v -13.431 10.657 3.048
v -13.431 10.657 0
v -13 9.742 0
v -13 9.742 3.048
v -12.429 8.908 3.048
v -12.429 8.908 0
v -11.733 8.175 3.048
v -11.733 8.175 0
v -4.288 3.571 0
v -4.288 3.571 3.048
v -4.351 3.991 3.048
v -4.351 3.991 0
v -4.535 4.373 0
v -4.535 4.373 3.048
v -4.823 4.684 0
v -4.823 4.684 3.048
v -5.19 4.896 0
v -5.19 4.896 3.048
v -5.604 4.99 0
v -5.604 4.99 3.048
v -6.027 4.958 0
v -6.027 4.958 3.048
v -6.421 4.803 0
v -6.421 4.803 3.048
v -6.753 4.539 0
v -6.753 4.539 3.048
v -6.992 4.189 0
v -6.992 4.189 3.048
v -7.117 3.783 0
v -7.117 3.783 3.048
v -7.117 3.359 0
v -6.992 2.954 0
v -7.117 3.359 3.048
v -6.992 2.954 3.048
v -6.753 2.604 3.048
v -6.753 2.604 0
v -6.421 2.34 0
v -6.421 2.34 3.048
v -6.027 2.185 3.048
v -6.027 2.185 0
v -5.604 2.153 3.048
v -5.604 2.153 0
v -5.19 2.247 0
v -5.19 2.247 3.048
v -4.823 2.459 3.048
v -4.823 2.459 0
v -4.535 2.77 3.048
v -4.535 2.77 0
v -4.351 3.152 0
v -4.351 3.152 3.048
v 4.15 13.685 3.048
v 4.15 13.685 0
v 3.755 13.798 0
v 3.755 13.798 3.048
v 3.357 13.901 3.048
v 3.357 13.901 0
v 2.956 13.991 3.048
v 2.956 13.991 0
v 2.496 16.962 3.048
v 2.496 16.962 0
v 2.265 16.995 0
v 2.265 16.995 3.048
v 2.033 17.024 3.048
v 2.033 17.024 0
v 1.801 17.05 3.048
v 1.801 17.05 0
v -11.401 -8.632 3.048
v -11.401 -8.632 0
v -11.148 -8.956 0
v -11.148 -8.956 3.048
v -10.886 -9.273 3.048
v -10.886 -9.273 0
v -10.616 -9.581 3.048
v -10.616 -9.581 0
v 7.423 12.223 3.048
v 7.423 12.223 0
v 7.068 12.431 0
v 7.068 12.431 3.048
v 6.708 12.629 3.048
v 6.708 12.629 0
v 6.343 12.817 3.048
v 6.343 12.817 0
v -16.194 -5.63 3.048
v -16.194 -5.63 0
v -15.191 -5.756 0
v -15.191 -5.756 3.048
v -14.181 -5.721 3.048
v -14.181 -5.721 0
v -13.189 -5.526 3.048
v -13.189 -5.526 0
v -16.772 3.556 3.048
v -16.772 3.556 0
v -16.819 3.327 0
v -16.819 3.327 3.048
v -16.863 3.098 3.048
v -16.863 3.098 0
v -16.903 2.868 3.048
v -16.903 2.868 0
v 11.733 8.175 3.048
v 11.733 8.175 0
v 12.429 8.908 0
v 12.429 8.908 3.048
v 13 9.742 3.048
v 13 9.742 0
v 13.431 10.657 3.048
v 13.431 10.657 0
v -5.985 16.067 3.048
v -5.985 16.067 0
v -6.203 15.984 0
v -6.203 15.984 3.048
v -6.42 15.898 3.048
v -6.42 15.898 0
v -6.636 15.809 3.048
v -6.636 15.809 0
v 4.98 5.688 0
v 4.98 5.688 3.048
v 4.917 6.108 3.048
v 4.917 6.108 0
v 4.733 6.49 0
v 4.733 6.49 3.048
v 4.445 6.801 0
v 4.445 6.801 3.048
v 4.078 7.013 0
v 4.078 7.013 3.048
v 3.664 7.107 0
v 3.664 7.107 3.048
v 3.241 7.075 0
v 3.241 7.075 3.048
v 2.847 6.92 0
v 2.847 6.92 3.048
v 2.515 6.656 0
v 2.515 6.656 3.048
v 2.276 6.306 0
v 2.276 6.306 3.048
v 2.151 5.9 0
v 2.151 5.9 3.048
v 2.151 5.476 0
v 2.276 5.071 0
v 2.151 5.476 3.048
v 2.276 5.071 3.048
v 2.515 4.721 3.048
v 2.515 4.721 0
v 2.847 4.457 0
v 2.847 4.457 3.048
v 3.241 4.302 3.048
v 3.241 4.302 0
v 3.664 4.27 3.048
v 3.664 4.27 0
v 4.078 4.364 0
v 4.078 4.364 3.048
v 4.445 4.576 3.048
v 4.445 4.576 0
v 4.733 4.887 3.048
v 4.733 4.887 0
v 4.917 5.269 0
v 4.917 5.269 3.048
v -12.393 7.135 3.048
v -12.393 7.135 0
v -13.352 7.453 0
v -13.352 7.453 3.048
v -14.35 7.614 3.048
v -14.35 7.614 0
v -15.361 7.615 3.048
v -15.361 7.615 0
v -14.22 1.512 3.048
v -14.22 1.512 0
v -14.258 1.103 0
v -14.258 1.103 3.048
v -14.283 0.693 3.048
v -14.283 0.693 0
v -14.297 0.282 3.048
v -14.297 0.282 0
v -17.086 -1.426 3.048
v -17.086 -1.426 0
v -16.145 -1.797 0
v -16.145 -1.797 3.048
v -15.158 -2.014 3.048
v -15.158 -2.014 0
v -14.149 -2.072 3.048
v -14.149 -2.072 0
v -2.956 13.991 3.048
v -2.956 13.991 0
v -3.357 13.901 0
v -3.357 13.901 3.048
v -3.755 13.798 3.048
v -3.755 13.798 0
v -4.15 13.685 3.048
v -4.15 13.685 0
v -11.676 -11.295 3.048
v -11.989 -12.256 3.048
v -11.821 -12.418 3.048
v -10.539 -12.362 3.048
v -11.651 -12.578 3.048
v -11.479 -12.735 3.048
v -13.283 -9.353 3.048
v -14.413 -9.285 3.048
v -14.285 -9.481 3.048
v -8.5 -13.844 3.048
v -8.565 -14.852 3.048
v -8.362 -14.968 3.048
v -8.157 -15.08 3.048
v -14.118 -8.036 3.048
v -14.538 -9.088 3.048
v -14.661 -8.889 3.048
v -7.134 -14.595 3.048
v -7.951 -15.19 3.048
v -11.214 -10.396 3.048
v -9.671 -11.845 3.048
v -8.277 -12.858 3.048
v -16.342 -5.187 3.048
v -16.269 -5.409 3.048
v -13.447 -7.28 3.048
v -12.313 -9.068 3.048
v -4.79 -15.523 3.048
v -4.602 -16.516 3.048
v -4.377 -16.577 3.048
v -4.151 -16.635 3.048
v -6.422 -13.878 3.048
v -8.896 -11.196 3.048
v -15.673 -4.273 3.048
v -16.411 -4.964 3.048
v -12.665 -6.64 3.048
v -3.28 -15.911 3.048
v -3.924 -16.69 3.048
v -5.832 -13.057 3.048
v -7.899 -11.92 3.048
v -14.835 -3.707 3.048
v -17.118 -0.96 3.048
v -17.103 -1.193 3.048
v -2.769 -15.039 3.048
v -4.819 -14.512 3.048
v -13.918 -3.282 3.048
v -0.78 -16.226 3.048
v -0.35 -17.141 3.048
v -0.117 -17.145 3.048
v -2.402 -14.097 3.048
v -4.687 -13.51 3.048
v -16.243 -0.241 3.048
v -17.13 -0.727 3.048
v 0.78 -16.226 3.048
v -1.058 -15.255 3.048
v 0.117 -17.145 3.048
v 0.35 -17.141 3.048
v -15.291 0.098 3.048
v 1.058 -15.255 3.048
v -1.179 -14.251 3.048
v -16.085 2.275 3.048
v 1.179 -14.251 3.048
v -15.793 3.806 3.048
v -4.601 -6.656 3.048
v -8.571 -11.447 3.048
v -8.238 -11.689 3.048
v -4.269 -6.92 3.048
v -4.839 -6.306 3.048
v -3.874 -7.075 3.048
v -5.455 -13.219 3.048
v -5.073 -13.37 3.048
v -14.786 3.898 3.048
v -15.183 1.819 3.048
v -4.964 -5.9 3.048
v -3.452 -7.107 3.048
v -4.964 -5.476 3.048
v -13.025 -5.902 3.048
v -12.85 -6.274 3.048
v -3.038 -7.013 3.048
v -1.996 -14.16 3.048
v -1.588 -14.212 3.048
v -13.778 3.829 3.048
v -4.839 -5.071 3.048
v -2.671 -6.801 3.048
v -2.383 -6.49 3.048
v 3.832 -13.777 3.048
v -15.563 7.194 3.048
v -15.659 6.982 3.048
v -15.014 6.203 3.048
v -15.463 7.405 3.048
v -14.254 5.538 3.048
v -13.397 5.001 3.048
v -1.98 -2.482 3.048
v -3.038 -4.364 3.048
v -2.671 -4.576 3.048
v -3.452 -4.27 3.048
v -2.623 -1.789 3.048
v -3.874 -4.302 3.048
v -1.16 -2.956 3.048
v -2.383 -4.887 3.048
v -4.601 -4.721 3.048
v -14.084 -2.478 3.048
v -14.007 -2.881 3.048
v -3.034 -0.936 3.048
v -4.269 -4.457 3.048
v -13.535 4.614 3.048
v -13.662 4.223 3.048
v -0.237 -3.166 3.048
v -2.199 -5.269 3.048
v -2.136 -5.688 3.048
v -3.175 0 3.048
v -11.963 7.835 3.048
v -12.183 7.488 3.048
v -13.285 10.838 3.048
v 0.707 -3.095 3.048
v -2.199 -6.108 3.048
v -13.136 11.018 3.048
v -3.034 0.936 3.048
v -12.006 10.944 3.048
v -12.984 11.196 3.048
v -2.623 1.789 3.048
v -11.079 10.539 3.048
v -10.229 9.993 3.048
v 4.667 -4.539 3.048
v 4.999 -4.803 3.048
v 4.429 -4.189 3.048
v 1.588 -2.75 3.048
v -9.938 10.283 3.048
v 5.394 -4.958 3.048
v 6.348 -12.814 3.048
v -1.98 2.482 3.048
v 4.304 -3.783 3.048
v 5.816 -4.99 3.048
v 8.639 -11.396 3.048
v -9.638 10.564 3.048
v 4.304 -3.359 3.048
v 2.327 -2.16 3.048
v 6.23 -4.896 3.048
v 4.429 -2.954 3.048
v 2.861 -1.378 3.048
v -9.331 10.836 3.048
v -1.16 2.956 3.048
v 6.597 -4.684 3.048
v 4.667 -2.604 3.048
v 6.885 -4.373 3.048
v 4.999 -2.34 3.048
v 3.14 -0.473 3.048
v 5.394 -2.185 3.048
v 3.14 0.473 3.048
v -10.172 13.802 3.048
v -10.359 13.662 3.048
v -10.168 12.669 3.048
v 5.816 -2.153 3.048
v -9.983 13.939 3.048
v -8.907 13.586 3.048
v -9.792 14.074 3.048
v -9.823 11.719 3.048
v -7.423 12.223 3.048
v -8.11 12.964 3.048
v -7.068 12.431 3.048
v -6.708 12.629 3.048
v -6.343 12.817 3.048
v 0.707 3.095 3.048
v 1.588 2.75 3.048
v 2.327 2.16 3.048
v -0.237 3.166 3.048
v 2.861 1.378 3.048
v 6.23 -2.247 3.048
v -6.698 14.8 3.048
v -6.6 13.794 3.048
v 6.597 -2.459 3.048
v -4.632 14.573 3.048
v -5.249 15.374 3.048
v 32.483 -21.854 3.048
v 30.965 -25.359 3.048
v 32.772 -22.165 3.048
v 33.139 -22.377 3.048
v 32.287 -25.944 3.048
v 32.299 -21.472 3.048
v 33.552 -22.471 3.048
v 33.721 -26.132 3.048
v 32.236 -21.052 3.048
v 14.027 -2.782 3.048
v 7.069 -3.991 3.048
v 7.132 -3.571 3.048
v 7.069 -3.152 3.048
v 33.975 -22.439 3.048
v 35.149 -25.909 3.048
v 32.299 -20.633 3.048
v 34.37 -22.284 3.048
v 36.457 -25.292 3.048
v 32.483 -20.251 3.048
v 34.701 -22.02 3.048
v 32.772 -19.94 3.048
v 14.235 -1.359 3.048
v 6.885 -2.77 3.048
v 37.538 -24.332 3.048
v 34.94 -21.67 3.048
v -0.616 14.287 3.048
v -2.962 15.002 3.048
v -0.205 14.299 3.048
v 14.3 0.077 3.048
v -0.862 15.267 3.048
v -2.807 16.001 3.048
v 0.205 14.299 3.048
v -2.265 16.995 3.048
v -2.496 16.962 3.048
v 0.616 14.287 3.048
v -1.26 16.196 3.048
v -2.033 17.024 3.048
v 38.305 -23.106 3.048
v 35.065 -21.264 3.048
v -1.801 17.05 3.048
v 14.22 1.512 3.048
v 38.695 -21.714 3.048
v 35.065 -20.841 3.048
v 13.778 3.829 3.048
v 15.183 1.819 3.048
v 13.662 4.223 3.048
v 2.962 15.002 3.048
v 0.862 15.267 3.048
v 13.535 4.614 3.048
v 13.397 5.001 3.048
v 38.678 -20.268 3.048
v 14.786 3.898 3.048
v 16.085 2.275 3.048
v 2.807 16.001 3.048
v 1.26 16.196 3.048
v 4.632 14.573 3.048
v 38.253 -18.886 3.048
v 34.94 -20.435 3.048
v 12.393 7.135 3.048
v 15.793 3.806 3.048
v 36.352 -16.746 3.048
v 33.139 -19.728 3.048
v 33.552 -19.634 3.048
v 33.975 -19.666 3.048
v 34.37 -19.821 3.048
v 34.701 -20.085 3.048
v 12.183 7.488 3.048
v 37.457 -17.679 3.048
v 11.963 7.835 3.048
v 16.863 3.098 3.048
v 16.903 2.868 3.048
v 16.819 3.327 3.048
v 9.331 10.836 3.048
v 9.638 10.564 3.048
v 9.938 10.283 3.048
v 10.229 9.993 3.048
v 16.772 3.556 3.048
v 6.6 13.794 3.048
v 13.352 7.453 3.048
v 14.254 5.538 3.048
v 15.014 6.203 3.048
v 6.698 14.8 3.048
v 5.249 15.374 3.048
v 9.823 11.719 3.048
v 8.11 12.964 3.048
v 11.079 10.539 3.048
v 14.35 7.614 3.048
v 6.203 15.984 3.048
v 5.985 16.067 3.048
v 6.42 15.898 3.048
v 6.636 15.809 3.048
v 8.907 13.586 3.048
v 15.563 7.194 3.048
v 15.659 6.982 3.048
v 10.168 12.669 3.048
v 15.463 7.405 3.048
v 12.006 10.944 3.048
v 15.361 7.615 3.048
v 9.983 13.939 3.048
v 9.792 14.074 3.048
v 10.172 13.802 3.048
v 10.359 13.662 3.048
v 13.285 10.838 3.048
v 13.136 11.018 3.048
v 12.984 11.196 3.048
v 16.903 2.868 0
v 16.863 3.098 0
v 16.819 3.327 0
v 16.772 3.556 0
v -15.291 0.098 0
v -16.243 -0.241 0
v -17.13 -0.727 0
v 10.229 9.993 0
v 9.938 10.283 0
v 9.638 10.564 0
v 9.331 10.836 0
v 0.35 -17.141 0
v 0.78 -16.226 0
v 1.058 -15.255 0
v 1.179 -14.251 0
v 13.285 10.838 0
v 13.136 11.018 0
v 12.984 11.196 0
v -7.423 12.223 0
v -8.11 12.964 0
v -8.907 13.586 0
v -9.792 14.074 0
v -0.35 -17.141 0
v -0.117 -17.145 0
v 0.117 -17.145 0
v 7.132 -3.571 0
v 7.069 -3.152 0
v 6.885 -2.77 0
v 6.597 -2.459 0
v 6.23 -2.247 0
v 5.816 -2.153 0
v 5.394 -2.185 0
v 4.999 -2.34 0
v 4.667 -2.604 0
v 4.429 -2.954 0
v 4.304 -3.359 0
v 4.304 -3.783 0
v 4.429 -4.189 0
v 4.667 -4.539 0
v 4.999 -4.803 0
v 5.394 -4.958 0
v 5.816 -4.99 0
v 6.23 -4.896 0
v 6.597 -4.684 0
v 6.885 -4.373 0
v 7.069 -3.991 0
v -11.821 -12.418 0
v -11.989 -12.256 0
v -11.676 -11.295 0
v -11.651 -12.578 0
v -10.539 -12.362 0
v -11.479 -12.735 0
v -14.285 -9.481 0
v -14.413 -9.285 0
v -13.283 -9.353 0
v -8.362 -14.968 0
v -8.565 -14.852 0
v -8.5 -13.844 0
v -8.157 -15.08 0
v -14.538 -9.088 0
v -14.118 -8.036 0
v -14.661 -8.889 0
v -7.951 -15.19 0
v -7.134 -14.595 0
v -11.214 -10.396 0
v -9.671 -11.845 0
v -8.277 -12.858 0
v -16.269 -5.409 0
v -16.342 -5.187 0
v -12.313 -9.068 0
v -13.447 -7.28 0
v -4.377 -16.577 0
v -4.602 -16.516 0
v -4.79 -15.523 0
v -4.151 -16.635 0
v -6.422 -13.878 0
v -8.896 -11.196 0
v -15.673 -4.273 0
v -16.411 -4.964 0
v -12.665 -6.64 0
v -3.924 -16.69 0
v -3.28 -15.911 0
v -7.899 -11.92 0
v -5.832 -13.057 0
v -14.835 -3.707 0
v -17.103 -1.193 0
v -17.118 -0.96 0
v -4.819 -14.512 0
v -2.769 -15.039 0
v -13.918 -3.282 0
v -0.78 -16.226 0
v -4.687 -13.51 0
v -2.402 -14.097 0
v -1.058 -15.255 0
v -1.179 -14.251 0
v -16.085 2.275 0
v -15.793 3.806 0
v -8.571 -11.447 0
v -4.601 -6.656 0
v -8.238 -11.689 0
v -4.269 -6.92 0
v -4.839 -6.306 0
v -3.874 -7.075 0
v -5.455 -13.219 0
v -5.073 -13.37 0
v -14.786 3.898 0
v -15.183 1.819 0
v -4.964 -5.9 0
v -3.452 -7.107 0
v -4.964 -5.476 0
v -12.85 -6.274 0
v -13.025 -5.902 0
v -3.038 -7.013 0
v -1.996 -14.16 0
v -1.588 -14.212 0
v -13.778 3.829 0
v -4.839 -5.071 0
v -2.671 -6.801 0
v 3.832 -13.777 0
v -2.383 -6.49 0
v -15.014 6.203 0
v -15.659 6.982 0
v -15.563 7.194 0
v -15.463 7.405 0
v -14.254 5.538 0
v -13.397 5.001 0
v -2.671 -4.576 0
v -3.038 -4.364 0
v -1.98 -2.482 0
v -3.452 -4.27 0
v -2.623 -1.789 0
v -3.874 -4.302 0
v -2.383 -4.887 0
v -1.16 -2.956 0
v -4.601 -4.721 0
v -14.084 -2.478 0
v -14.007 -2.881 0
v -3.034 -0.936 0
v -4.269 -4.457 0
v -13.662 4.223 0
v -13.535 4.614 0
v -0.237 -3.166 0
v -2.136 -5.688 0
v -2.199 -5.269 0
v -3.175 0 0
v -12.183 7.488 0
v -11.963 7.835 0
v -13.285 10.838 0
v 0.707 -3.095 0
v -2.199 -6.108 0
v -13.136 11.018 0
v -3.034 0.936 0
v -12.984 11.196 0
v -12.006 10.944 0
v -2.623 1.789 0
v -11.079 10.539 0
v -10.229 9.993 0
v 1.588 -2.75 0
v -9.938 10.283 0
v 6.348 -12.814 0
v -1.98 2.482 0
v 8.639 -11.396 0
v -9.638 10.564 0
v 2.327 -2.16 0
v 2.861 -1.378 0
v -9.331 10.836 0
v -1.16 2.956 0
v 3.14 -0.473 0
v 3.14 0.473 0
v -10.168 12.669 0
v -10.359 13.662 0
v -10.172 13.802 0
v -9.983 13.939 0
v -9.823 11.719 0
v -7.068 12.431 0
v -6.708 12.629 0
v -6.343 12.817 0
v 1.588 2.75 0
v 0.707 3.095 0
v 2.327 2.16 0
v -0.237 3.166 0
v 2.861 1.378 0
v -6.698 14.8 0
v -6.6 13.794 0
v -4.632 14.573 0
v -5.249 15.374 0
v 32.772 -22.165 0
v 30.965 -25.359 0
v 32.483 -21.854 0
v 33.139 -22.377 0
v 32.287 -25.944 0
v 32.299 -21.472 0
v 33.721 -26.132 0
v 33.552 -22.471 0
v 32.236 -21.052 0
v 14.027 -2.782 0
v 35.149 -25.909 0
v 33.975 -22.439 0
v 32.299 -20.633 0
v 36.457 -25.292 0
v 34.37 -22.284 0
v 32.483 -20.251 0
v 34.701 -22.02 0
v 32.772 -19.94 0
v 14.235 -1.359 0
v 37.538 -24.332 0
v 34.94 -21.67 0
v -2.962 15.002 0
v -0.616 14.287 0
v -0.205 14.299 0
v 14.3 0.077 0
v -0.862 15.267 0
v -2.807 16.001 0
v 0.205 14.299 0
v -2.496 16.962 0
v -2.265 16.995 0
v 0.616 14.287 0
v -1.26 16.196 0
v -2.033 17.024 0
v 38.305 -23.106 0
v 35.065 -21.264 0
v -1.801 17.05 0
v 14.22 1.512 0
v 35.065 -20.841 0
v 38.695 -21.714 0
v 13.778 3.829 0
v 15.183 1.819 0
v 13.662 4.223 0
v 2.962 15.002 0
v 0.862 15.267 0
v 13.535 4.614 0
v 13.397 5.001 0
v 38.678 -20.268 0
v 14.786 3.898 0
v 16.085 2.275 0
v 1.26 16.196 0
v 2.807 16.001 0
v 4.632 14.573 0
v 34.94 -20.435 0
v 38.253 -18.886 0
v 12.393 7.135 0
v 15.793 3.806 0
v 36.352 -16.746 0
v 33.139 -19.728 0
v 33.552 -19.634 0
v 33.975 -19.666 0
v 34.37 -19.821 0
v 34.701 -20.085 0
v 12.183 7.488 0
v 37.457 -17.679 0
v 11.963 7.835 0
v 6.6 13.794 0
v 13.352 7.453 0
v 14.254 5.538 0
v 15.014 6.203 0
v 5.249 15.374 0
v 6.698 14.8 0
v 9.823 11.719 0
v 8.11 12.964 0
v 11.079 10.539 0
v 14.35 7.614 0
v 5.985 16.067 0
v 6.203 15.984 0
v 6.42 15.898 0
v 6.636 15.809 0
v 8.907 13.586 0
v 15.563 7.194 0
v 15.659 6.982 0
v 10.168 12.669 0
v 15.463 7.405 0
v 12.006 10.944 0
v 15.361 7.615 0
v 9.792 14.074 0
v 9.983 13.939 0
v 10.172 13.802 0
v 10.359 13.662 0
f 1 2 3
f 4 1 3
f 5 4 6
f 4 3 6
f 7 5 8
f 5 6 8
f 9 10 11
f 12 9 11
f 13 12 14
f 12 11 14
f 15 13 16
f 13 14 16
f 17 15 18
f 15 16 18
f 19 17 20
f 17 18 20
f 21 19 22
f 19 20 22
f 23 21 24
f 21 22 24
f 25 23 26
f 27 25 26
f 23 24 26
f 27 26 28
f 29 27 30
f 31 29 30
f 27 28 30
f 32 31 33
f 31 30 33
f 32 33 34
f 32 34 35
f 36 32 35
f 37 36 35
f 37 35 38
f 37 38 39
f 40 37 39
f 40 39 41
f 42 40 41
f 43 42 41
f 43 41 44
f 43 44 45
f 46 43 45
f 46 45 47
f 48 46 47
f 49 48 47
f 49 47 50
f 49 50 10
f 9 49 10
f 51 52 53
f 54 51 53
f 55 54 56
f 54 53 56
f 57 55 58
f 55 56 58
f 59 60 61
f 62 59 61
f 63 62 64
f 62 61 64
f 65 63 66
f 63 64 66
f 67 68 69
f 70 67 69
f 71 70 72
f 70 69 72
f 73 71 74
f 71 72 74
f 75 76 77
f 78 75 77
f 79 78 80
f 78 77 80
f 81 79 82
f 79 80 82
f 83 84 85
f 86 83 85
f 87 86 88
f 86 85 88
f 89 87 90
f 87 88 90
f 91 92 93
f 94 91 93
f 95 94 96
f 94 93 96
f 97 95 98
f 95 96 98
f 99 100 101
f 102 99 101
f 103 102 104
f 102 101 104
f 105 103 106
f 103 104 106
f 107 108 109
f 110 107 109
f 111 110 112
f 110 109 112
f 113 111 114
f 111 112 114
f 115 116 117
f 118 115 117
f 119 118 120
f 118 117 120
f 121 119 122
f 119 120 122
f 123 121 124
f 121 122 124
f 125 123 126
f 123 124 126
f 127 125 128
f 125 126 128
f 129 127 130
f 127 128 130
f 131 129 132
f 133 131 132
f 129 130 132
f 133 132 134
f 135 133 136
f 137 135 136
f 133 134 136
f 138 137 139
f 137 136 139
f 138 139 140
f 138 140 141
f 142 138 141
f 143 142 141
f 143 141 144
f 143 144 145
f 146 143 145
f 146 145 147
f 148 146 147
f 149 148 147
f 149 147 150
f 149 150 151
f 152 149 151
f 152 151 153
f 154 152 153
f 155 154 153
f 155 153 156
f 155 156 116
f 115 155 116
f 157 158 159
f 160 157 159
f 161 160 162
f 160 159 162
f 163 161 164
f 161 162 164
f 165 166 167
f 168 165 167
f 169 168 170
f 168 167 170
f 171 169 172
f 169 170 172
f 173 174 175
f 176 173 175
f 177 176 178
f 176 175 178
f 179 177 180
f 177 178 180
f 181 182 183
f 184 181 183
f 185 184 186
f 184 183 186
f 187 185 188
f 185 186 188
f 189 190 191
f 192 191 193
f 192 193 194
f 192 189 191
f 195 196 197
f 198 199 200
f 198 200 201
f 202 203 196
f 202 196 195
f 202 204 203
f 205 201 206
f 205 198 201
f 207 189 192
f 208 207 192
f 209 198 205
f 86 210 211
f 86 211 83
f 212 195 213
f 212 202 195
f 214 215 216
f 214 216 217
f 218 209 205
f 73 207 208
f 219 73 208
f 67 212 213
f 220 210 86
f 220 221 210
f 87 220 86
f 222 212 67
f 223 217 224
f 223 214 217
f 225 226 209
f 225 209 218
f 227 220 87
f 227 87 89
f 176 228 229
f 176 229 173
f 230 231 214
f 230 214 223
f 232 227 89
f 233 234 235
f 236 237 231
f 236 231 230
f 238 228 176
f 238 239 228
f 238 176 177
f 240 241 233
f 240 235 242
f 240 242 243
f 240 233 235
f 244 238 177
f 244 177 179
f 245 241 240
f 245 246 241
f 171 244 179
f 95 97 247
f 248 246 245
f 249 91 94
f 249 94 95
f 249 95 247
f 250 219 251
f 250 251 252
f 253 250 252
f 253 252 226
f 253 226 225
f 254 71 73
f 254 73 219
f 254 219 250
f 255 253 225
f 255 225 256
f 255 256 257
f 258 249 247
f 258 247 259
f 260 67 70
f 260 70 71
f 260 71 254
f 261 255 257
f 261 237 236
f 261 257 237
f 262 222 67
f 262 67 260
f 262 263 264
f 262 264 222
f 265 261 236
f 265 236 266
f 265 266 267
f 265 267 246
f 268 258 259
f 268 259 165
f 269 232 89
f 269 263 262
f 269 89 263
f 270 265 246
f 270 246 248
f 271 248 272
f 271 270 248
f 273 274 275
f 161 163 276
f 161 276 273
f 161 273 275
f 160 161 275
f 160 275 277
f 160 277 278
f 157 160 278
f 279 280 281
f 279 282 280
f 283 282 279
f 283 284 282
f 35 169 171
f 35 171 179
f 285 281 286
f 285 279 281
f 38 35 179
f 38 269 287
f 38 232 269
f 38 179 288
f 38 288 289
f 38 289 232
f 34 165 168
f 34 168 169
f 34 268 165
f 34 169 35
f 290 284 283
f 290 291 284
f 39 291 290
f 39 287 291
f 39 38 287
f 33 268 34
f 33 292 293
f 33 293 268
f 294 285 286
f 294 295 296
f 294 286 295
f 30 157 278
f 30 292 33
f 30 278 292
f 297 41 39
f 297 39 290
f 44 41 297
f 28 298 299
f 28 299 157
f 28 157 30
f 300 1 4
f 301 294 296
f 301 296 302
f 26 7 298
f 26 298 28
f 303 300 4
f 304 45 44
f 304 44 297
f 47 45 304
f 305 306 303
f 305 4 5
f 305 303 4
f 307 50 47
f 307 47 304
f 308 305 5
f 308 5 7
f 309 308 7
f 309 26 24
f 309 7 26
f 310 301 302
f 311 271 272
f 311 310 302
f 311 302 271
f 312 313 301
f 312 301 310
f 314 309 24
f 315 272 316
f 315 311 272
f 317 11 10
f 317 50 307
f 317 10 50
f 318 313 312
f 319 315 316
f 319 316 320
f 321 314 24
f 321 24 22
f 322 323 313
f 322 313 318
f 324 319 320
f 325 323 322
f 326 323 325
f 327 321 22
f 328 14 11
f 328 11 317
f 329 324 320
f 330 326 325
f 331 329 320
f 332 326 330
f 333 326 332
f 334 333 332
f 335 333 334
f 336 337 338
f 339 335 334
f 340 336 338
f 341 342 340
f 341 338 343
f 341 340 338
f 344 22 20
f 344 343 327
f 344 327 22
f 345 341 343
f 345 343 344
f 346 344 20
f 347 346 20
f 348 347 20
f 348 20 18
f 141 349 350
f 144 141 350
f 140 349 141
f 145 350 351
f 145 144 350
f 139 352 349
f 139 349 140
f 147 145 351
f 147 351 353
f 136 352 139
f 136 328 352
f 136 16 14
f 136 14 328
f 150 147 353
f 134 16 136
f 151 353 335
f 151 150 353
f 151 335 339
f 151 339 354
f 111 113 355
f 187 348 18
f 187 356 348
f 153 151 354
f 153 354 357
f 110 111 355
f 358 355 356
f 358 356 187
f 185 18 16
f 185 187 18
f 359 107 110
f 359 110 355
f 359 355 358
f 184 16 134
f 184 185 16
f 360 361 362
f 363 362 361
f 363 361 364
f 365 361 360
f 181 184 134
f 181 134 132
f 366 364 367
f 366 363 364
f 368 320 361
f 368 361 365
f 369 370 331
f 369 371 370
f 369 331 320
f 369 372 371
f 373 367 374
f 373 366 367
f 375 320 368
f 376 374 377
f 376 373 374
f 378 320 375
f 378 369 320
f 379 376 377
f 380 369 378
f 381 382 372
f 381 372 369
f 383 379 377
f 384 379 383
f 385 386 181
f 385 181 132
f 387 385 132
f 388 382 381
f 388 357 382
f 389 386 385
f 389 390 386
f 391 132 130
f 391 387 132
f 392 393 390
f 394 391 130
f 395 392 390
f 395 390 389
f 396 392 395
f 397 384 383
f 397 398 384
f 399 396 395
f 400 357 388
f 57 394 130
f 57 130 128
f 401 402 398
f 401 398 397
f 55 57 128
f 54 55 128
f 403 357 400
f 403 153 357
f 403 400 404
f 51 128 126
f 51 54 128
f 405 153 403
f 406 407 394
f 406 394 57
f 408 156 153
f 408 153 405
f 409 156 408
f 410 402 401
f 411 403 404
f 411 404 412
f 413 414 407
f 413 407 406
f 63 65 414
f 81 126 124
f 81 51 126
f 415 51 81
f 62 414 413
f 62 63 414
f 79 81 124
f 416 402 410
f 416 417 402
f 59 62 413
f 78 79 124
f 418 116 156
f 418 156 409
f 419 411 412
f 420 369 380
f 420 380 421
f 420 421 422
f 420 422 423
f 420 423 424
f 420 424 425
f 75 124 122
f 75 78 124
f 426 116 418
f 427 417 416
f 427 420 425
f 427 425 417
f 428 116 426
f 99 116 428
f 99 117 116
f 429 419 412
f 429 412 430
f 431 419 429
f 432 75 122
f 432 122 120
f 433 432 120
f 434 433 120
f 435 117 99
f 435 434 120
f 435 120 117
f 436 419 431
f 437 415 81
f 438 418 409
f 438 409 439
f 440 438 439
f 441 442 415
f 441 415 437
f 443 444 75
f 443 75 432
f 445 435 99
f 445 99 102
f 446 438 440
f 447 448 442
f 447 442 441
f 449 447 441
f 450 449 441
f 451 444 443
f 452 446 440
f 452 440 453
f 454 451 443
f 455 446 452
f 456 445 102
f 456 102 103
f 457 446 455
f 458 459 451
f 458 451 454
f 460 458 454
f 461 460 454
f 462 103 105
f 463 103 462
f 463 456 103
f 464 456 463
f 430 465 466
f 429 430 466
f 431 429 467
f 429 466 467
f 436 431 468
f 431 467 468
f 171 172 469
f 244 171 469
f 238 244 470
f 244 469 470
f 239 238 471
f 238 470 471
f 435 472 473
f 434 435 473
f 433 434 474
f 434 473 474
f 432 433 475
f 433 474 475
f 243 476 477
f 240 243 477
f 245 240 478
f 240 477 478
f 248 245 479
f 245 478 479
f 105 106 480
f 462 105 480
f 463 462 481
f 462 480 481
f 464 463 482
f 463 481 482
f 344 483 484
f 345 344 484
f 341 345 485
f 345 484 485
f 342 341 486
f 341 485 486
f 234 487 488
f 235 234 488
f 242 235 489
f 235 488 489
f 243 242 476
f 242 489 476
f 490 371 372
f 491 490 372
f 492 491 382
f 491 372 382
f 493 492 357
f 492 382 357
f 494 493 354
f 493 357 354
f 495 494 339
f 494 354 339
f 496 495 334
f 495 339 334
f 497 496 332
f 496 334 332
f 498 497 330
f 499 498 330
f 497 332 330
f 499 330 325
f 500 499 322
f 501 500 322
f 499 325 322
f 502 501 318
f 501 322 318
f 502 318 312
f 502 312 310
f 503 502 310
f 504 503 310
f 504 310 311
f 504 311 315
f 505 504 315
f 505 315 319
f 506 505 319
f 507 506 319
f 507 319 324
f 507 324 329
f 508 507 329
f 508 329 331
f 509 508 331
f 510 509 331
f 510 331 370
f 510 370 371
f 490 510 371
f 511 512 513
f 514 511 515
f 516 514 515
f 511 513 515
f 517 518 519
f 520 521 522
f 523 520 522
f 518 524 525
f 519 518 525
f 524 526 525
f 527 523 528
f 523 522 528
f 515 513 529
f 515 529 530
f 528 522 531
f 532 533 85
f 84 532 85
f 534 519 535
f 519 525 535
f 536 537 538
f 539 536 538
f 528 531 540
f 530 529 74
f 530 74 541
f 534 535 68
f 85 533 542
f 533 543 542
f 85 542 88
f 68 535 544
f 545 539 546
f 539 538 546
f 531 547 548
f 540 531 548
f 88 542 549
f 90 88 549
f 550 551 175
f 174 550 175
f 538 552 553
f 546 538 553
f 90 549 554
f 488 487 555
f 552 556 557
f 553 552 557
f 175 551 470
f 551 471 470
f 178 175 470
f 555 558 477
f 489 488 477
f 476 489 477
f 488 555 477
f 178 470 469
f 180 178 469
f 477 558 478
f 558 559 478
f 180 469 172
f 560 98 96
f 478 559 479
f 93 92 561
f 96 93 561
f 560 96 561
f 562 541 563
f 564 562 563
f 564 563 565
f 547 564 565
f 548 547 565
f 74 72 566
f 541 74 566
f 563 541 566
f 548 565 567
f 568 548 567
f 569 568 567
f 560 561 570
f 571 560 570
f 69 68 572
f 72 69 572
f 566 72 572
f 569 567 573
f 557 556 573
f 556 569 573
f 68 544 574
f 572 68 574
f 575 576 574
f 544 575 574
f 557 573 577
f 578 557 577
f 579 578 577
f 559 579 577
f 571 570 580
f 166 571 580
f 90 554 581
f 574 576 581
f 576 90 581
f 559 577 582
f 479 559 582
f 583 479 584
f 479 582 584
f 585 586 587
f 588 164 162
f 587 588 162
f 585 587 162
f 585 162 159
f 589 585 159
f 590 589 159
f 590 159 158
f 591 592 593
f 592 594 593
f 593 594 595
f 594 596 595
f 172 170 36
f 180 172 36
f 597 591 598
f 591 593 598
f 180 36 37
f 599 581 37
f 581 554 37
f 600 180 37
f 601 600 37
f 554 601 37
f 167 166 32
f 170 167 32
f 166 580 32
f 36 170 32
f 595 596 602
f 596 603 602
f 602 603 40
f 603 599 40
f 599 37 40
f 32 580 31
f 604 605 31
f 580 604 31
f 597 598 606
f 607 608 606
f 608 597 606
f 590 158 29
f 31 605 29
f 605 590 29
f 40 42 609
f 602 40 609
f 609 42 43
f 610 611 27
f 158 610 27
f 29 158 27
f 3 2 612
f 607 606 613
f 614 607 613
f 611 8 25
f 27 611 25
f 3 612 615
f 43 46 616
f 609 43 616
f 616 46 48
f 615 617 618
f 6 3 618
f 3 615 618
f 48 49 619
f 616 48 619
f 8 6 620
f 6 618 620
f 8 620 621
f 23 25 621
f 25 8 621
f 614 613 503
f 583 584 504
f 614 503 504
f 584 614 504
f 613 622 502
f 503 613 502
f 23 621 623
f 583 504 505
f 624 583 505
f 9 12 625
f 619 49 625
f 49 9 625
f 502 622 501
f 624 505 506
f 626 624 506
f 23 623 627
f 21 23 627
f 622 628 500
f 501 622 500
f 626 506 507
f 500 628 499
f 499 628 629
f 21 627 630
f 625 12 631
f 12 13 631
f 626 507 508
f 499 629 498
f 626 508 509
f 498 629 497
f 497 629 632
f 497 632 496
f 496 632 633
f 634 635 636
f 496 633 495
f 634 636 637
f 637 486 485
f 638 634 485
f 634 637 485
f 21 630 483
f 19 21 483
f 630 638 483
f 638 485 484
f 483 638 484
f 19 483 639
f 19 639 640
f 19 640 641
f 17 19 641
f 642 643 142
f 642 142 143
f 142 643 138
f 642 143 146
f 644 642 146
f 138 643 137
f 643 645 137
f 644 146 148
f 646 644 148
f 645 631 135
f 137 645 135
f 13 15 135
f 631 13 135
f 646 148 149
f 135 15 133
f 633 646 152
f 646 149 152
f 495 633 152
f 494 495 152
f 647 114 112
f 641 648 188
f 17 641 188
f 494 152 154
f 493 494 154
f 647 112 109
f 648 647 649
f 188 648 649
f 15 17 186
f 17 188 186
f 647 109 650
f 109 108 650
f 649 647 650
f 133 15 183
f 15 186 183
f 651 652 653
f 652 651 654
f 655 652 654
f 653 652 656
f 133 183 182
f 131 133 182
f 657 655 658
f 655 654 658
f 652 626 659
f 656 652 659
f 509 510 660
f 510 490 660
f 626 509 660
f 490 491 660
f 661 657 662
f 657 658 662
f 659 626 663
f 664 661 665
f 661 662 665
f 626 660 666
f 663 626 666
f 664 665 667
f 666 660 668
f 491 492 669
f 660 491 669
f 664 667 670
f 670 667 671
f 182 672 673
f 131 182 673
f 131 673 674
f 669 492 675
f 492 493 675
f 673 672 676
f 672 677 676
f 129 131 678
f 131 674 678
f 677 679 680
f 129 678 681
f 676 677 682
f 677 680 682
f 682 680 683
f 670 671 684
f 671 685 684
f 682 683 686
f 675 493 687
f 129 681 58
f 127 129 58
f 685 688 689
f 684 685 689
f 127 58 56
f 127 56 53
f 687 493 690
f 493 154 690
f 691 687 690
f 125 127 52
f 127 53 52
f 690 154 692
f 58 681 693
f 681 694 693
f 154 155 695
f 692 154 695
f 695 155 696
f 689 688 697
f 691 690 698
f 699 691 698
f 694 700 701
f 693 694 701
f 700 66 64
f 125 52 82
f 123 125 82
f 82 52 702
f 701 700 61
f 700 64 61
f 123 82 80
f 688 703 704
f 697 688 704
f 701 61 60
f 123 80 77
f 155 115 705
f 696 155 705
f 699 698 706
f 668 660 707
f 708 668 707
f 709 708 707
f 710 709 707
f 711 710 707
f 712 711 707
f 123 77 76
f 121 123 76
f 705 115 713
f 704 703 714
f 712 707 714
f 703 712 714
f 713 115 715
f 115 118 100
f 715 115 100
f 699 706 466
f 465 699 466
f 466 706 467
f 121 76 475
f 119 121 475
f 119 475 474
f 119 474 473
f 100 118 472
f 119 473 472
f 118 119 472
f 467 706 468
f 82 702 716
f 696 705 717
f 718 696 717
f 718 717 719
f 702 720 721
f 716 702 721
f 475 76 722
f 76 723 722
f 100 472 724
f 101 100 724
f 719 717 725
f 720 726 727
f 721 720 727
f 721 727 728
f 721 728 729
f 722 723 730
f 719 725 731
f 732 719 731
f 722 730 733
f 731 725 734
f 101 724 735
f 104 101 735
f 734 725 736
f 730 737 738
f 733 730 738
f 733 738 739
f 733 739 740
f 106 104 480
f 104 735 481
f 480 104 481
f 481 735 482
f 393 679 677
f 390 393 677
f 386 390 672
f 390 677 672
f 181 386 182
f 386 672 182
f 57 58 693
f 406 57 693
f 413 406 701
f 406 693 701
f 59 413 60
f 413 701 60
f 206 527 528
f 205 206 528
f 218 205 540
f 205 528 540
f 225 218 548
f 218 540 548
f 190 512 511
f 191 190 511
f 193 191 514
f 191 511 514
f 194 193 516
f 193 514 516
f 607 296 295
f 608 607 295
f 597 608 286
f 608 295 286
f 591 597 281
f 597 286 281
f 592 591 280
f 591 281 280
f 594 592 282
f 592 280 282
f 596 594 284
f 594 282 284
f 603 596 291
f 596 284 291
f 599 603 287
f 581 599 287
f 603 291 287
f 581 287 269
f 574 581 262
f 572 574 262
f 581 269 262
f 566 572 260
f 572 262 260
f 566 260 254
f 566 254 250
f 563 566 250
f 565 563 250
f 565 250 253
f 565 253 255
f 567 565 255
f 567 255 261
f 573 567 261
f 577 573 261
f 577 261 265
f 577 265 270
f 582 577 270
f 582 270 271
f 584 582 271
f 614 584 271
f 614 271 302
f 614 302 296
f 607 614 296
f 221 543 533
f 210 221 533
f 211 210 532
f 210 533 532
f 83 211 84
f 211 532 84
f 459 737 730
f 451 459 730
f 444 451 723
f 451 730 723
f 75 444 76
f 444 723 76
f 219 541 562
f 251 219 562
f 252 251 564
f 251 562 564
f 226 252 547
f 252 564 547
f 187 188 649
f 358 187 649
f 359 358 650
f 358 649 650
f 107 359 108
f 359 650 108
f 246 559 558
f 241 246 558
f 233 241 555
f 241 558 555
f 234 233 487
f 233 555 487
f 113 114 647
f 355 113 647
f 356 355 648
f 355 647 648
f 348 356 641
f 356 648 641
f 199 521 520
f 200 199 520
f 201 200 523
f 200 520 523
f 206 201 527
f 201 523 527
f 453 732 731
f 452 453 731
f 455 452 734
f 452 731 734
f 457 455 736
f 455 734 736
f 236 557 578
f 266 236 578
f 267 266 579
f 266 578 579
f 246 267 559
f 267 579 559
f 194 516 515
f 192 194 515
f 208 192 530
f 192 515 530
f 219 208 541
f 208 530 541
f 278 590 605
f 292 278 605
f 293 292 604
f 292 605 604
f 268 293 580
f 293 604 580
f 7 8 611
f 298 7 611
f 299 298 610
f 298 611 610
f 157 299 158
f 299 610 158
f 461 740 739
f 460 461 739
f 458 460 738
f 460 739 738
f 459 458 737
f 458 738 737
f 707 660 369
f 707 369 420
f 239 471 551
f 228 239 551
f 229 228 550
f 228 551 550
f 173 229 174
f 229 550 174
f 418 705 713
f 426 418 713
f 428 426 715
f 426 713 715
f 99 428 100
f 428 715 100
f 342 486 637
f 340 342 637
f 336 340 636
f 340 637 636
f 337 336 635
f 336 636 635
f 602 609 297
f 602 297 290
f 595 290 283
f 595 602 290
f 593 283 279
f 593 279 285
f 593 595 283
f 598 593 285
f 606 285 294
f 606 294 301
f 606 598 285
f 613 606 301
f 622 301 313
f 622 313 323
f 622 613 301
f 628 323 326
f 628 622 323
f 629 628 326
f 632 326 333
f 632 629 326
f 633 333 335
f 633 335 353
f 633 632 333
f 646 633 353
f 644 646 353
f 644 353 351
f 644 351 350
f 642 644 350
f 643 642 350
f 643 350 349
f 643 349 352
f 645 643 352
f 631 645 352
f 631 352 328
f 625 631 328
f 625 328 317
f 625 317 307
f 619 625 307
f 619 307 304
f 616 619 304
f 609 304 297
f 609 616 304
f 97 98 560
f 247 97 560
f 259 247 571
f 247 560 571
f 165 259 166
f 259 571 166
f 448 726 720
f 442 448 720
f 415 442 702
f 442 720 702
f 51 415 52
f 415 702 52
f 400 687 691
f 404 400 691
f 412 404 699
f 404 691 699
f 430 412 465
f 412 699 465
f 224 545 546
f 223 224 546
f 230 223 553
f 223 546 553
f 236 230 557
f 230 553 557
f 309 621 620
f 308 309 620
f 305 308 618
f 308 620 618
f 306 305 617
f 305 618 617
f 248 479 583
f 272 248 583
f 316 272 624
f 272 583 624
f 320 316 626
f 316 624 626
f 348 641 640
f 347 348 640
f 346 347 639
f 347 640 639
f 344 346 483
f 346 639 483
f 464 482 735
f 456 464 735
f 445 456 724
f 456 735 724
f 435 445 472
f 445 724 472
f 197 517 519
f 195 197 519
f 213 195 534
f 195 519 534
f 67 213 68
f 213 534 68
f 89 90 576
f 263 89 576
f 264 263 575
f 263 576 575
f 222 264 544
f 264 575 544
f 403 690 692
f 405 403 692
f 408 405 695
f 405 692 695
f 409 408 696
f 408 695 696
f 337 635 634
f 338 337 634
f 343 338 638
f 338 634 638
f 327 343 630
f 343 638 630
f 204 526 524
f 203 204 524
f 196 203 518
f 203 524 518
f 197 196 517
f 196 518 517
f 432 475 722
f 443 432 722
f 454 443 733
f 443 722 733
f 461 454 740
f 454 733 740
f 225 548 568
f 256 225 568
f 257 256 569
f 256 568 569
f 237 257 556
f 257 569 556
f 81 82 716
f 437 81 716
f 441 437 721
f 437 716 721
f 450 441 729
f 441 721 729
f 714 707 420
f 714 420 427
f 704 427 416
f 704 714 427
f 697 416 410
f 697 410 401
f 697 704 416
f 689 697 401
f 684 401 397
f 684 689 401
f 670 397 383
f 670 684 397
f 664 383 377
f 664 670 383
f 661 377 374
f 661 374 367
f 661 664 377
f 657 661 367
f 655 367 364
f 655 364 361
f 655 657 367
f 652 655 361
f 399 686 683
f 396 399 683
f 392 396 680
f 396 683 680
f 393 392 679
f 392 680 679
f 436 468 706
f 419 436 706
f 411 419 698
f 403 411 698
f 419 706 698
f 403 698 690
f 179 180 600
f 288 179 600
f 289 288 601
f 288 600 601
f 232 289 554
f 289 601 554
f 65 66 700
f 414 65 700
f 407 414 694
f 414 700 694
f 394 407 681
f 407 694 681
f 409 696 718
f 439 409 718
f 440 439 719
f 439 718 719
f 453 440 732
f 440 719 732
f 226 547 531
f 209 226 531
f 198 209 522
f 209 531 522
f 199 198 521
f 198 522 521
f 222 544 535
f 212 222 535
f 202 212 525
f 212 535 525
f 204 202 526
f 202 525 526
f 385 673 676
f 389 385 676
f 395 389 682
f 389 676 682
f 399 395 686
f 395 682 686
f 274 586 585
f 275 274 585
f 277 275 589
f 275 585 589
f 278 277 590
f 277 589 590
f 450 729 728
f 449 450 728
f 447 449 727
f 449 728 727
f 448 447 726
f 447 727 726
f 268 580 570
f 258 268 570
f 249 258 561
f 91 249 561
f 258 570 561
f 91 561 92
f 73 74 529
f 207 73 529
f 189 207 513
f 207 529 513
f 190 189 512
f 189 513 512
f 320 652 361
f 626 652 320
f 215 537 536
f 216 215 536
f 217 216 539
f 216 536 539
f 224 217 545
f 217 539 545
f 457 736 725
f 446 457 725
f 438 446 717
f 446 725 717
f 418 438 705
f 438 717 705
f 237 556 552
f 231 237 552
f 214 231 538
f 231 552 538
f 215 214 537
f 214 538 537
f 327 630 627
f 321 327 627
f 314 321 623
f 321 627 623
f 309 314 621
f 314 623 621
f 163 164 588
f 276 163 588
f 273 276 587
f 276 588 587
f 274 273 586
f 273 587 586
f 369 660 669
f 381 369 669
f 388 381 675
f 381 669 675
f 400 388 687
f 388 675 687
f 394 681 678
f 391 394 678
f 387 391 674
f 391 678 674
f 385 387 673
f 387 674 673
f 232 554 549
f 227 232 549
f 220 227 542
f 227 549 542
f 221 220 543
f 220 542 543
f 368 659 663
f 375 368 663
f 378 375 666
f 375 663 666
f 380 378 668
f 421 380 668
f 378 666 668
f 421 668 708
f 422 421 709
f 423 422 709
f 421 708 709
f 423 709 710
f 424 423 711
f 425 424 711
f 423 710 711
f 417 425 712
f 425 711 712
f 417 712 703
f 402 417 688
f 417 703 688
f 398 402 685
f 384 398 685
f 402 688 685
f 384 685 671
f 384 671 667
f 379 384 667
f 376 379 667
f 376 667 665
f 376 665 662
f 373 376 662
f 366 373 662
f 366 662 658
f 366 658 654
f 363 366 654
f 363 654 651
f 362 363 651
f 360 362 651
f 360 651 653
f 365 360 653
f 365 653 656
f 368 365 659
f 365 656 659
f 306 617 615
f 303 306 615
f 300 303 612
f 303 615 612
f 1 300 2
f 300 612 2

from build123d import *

# Parameters (mm, degrees)
MODEL_R             = 3.175
BOSS_EXTRUDE1_DEPTH = 3.048
SKETCH2_R           = 1.4224
BOSS_EXTRUDE2_DEPTH = 3.048
SKETCH3_R           = 1.4224
SKETCH3_R_2         = 0.475
CUT_EXTRUDE1_DEPTH  = 47.828124767


with BuildPart() as part:
    # Model → Boss-Extrude1 (new body)
    with BuildSketch(Plane.XY):
        with BuildLine():
            ThreePointArc((-0.616026415, 14.286925194), (-1.042592722, 15.739677645), (-1.800954663, 17.050149187))
            ThreePointArc((-1.800954663, 17.050149187), (-2.148838289, 17.009806554), (-2.495825317, 16.962366609))
            ThreePointArc((-2.495825317, 16.962366609), (-2.904460903, 15.504468994), (-2.956341002, 13.991274707))
            ThreePointArc((-2.956341002, 13.991274707), (-3.556315124, 13.850932921), (-4.149686627, 13.684875627))
            ThreePointArc((-4.149686627, 13.684875627), (-4.924136412, 14.985904462), (-5.984574038, 16.066608185))
            ThreePointArc((-5.984574038, 16.066608185), (-6.311495456, 15.941017851), (-6.635783413, 15.808776154))
            ThreePointArc((-6.635783413, 15.808776154), (-6.669016568, 14.295057536), (-6.342950641, 12.816500973))
            ThreePointArc((-6.342950641, 12.816500973), (-6.88917389, 12.531360786), (-7.422606766, 12.222954996))
            ThreePointArc((-7.422606766, 12.222954996), (-8.496278501, 13.290511787), (-9.792160616, 14.073543103))
            ThreePointArc((-9.792160616, 14.073543103), (-10.077578151, 13.870596369), (-10.358790833, 13.661862153))
            ThreePointArc((-10.358790833, 13.661862153), (-10.014533394, 12.187435039), (-9.331009364, 10.836419348))
            ThreePointArc((-9.331009364, 10.836419348), (-9.789160524, 10.424397166), (-10.229137224, 9.993021149))
            ThreePointArc((-10.229137224, 9.993021149), (-11.534568165, 10.760027378), (-12.98446973, 11.196185548))
            ThreePointArc((-12.98446973, 11.196185548), (-13.210449547, 10.928634304), (-13.430917328, 10.656523107))
            ThreePointArc((-13.430917328, 10.656523107), (-12.730800257, 9.314031176), (-11.732766451, 8.175445642))
            ThreePointArc((-11.732766451, 8.175445642), (-12.0740582, 7.662430334), (-12.39293337, 7.135189032))
            ThreePointArc((-12.39293337, 7.135189032), (-13.84809849, 7.553450876), (-15.360916858, 7.615330478))
            ThreePointArc((-15.360916858, 7.615330478), (-15.513259815, 7.299985954), (-15.659129891, 6.981595523))
            ThreePointArc((-15.659129891, 6.981595523), (-14.647144119, 5.85539248), (-13.397310672, 5.000778618))
            ThreePointArc((-13.397310672, 5.000778618), (-13.600298394, 4.419004823), (-13.778035935, 3.829026746))
            ThreePointArc((-13.778035935, 3.829026746), (-15.291501858, 3.872263276), (-16.772181085, 3.555976188))
            ThreePointArc((-16.772181085, 3.555976188), (-16.841314914, 3.212652639), (-16.903421733, 2.867988616))
            ThreePointArc((-16.903421733, 2.867988616), (-15.643154047, 2.02883794), (-14.220052592, 1.511894283))
            ThreePointArc((-14.220052592, 1.511894283), (-14.271981822, 0.897916987), (-14.297413829, 0.282272628))
            ThreePointArc((-14.297413829, 0.282272628), (-15.774083925, -0.052232867), (-17.129587491, -0.726813165))
            ThreePointArc((-17.129587491, -0.726813165), (-17.111168259, -1.076543457), (-17.085609422, -1.425824564))
            ThreePointArc((-17.085609422, -1.425824564), (-15.656247076, -1.92519595), (-14.14929631, -2.071987931))
            ThreePointArc((-14.14929631, -2.071987931), (-14.046904143, -2.679590275), (-13.918432631, -3.282217718))
            ThreePointArc((-13.918432631, -3.282217718), (-15.265522286, -3.973447027), (-16.410678917, -4.963934173))
            ThreePointArc((-16.410678917, -4.963934173), (-16.305863972, -5.298096369), (-16.194245434, -5.630047943))
            ThreePointArc((-16.194245434, -5.630047943), (-14.68560052, -5.758262697), (-13.189487703, -5.525679522))
            ThreePointArc((-13.189487703, -5.525679522), (-12.939207816, -6.088729025), (-12.664905121, -6.640474253))
            ThreePointArc((-12.664905121, -6.640474253), (-13.797771739, -7.644994897), (-14.660627033, -8.889152941))
            ThreePointArc((-14.660627033, -8.889152941), (-14.476002283, -9.1867504), (-14.285337446, -9.480514703))
            ThreePointArc((-14.285337446, -9.480514703), (-12.792203675, -9.229516622), (-11.400935076, -8.632172348))
            ThreePointArc((-11.400935076, -8.632172348), (-11.018493474, -9.115290538), (-10.615595045, -9.581485369))
            ThreePointArc((-10.615595045, -9.581485369), (-11.46305645, -10.836179621), (-11.989394033, -12.255833538))
            ThreePointArc((-11.989394033, -12.255833538), (-11.736560131, -12.498167117), (-11.47882917, -12.735285858))
            ThreePointArc((-11.47882917, -12.735285858), (-10.095025626, -12.120846074), (-8.896019768, -11.196274037))
            ThreePointArc((-8.896019768, -11.196274037), (-8.405446665, -11.569104823), (-7.899268091, -11.920456521))
            ThreePointArc((-7.899268091, -11.920456521), (-8.408075165, -13.346487327), (-8.564823313, -14.85243504))
            ThreePointArc((-8.564823313, -14.85243504), (-8.259666742, -15.024278029), (-7.95106384, -15.189852165))
            ThreePointArc((-7.95106384, -15.189852165), (-6.76353999, -14.25057819), (-5.832134822, -13.056872652))
            ThreePointArc((-5.832134822, -13.056872652), (-5.264254728, -13.295989703), (-4.686601071, -13.510421549))
            ThreePointArc((-4.686601071, -13.510421549), (-4.824783595, -15.018186149), (-4.602093245, -16.515803425))
            ThreePointArc((-4.602093245, -16.515803425), (-4.263788115, -16.606358298), (-3.923703928, -16.689984197))
            ThreePointArc((-3.923703928, -16.689984197), (-3.007076261, -15.484894068), (-2.401795395, -14.097059939))
            ThreePointArc((-2.401795395, -14.097059939), (-1.792290307, -14.187438652), (-1.17945767, -14.251477104))
            ThreePointArc((-1.17945767, -14.251477104), (-0.938333127, -15.746237102), (-0.350196733, -17.14142314))
            ThreePointArc((-0.350196733, -17.14142314), (0, -17.145), (0.350196733, -17.14142314))
            ThreePointArc((0.350196733, -17.14142314), (0.938333127, -15.746237102), (1.17945767, -14.251477104))
            ThreePointArc((1.17945767, -14.251477104), (11.018493474, -9.115290538), (14.220052592, 1.511894283))
            ThreePointArc((14.220052592, 1.511894283), (15.643154047, 2.02883794), (16.903421733, 2.867988616))
            ThreePointArc((16.903421733, 2.867988616), (16.841314914, 3.212652639), (16.772181085, 3.555976188))
            ThreePointArc((16.772181085, 3.555976188), (15.291501858, 3.872263276), (13.778035935, 3.829026746))
            ThreePointArc((13.778035935, 3.829026746), (13.600298394, 4.419004823), (13.397310672, 5.000778619))
            ThreePointArc((13.397310672, 5.000778618), (14.647144119, 5.85539248), (15.659129891, 6.981595523))
            ThreePointArc((15.659129891, 6.981595523), (15.513259815, 7.299985954), (15.360916858, 7.615330478))
            ThreePointArc((15.360916858, 7.615330478), (13.84809849, 7.553450876), (12.39293337, 7.135189032))
            ThreePointArc((12.39293337, 7.135189032), (12.0740582, 7.662430334), (11.732766451, 8.175445642))
            ThreePointArc((11.732766451, 8.175445642), (12.730800257, 9.314031176), (13.430917328, 10.656523107))
            ThreePointArc((13.430917328, 10.656523107), (13.210449547, 10.928634304), (12.98446973, 11.196185548))
            ThreePointArc((12.98446973, 11.196185548), (11.534568165, 10.760027378), (10.229137224, 9.993021149))
            ThreePointArc((10.229137224, 9.993021149), (9.789160524, 10.424397166), (9.331009364, 10.836419348))
            ThreePointArc((9.331009364, 10.836419348), (10.014533394, 12.187435039), (10.358790833, 13.661862153))
            ThreePointArc((10.358790833, 13.661862153), (10.077578151, 13.870596369), (9.792160616, 14.073543103))
            ThreePointArc((9.792160616, 14.073543103), (8.496278501, 13.290511787), (7.422606766, 12.222954996))
            ThreePointArc((7.422606766, 12.222954996), (6.88917389, 12.531360786), (6.342950641, 12.816500974))
            ThreePointArc((6.342950641, 12.816500973), (6.669016568, 14.295057536), (6.635783413, 15.808776154))
            ThreePointArc((6.635783413, 15.808776154), (6.311495456, 15.941017851), (5.984574038, 16.066608185))
            ThreePointArc((5.984574038, 16.066608185), (4.924136412, 14.985904462), (4.149686627, 13.684875627))
            ThreePointArc((4.149686627, 13.684875628), (3.556315124, 13.850932921), (2.956341002, 13.991274707))
            ThreePointArc((2.956341002, 13.991274707), (2.904460903, 15.504468994), (2.495825317, 16.962366609))
            ThreePointArc((2.495825317, 16.962366609), (2.148838289, 17.009806554), (1.800954663, 17.050149187))
            ThreePointArc((1.800954663, 17.050149187), (1.042592722, 15.739677645), (0.616026415, 14.286925194))
            ThreePointArc((0.616026415, 14.286925194), (0, 14.3002), (-0.616026415, 14.286925194))
        make_face()
        with Locations(Location((0, 0, 0), (0, 0, 180))):
            Circle(MODEL_R, mode=Mode.SUBTRACT)
    extrude(amount=BOSS_EXTRUDE1_DEPTH)

    # Sketch2 → Boss-Extrude2 (add)
    with BuildSketch(Plane(origin=(0, 0, 0), x_dir=(-1, 0, 0), z_dir=(0, 0, -1))):
        with BuildLine():
            Line((-30.964694704, -25.359415647), (-8.63932874, -11.395513106))
            ThreePointArc((-8.63932874, -11.395513106), (-12.123969987, -7.58320986), (-14.027044449, -2.781680078))
            Line((-14.027044449, -2.781680078), (-36.352410413, -16.745582618))
            ThreePointArc((-36.352410413, -16.745582618), (-37.965469072, -23.746356987), (-30.964694704, -25.359415647))
        make_face()
        with Locations((-33.658552558, -21.052499132)):
            Circle(SKETCH2_R, mode=Mode.SUBTRACT)
    extrude(amount=-BOSS_EXTRUDE2_DEPTH)

    # Sketch3 → Cut-Extrude1 (cut, through all)
    # profile 1 of 6: a face of its own
    with BuildSketch(Plane.XY.offset(3.048)):
        with Locations((-5.710055654, 3.571482805)):
            Circle(SKETCH3_R)
        with Locations((-5.710055654, 3.571482805)):
            Circle(SKETCH3_R_2, mode=Mode.SUBTRACT)
    # profile 2 of 6: a face of its own
    with BuildSketch(Plane.XY.offset(3.048)):
        with Locations((3.557960487, 5.68843629)):
            Circle(SKETCH3_R)
        with Locations((3.557960487, 5.68843629)):
            Circle(SKETCH3_R_2, mode=Mode.SUBTRACT)
    # profile 3 of 6: a face of its own
    with BuildSketch(Plane.XY.offset(3.048)):
        with Locations((-5.710055654, 3.571482805)):
            Circle(SKETCH3_R_2)
    # profile 4 of 6: a face of its own
    with BuildSketch(Plane.XY.offset(3.048)):
        with Locations((3.557960487, 5.68843629)):
            Circle(SKETCH3_R_2)
    # profile 5 of 6: a face of its own
    with BuildSketch(Plane.XY.offset(3.048)):
        with Locations((5.710055654, -3.571482805)):
            Circle(SKETCH3_R)
    # profile 6 of 6: a face of its own
    with BuildSketch(Plane.XY.offset(3.048)):
        with Locations((-3.557960487, -5.68843629)):
            Circle(SKETCH3_R)
    extrude(amount=-CUT_EXTRUDE1_DEPTH, mode=Mode.SUBTRACT)


solid = part.part
